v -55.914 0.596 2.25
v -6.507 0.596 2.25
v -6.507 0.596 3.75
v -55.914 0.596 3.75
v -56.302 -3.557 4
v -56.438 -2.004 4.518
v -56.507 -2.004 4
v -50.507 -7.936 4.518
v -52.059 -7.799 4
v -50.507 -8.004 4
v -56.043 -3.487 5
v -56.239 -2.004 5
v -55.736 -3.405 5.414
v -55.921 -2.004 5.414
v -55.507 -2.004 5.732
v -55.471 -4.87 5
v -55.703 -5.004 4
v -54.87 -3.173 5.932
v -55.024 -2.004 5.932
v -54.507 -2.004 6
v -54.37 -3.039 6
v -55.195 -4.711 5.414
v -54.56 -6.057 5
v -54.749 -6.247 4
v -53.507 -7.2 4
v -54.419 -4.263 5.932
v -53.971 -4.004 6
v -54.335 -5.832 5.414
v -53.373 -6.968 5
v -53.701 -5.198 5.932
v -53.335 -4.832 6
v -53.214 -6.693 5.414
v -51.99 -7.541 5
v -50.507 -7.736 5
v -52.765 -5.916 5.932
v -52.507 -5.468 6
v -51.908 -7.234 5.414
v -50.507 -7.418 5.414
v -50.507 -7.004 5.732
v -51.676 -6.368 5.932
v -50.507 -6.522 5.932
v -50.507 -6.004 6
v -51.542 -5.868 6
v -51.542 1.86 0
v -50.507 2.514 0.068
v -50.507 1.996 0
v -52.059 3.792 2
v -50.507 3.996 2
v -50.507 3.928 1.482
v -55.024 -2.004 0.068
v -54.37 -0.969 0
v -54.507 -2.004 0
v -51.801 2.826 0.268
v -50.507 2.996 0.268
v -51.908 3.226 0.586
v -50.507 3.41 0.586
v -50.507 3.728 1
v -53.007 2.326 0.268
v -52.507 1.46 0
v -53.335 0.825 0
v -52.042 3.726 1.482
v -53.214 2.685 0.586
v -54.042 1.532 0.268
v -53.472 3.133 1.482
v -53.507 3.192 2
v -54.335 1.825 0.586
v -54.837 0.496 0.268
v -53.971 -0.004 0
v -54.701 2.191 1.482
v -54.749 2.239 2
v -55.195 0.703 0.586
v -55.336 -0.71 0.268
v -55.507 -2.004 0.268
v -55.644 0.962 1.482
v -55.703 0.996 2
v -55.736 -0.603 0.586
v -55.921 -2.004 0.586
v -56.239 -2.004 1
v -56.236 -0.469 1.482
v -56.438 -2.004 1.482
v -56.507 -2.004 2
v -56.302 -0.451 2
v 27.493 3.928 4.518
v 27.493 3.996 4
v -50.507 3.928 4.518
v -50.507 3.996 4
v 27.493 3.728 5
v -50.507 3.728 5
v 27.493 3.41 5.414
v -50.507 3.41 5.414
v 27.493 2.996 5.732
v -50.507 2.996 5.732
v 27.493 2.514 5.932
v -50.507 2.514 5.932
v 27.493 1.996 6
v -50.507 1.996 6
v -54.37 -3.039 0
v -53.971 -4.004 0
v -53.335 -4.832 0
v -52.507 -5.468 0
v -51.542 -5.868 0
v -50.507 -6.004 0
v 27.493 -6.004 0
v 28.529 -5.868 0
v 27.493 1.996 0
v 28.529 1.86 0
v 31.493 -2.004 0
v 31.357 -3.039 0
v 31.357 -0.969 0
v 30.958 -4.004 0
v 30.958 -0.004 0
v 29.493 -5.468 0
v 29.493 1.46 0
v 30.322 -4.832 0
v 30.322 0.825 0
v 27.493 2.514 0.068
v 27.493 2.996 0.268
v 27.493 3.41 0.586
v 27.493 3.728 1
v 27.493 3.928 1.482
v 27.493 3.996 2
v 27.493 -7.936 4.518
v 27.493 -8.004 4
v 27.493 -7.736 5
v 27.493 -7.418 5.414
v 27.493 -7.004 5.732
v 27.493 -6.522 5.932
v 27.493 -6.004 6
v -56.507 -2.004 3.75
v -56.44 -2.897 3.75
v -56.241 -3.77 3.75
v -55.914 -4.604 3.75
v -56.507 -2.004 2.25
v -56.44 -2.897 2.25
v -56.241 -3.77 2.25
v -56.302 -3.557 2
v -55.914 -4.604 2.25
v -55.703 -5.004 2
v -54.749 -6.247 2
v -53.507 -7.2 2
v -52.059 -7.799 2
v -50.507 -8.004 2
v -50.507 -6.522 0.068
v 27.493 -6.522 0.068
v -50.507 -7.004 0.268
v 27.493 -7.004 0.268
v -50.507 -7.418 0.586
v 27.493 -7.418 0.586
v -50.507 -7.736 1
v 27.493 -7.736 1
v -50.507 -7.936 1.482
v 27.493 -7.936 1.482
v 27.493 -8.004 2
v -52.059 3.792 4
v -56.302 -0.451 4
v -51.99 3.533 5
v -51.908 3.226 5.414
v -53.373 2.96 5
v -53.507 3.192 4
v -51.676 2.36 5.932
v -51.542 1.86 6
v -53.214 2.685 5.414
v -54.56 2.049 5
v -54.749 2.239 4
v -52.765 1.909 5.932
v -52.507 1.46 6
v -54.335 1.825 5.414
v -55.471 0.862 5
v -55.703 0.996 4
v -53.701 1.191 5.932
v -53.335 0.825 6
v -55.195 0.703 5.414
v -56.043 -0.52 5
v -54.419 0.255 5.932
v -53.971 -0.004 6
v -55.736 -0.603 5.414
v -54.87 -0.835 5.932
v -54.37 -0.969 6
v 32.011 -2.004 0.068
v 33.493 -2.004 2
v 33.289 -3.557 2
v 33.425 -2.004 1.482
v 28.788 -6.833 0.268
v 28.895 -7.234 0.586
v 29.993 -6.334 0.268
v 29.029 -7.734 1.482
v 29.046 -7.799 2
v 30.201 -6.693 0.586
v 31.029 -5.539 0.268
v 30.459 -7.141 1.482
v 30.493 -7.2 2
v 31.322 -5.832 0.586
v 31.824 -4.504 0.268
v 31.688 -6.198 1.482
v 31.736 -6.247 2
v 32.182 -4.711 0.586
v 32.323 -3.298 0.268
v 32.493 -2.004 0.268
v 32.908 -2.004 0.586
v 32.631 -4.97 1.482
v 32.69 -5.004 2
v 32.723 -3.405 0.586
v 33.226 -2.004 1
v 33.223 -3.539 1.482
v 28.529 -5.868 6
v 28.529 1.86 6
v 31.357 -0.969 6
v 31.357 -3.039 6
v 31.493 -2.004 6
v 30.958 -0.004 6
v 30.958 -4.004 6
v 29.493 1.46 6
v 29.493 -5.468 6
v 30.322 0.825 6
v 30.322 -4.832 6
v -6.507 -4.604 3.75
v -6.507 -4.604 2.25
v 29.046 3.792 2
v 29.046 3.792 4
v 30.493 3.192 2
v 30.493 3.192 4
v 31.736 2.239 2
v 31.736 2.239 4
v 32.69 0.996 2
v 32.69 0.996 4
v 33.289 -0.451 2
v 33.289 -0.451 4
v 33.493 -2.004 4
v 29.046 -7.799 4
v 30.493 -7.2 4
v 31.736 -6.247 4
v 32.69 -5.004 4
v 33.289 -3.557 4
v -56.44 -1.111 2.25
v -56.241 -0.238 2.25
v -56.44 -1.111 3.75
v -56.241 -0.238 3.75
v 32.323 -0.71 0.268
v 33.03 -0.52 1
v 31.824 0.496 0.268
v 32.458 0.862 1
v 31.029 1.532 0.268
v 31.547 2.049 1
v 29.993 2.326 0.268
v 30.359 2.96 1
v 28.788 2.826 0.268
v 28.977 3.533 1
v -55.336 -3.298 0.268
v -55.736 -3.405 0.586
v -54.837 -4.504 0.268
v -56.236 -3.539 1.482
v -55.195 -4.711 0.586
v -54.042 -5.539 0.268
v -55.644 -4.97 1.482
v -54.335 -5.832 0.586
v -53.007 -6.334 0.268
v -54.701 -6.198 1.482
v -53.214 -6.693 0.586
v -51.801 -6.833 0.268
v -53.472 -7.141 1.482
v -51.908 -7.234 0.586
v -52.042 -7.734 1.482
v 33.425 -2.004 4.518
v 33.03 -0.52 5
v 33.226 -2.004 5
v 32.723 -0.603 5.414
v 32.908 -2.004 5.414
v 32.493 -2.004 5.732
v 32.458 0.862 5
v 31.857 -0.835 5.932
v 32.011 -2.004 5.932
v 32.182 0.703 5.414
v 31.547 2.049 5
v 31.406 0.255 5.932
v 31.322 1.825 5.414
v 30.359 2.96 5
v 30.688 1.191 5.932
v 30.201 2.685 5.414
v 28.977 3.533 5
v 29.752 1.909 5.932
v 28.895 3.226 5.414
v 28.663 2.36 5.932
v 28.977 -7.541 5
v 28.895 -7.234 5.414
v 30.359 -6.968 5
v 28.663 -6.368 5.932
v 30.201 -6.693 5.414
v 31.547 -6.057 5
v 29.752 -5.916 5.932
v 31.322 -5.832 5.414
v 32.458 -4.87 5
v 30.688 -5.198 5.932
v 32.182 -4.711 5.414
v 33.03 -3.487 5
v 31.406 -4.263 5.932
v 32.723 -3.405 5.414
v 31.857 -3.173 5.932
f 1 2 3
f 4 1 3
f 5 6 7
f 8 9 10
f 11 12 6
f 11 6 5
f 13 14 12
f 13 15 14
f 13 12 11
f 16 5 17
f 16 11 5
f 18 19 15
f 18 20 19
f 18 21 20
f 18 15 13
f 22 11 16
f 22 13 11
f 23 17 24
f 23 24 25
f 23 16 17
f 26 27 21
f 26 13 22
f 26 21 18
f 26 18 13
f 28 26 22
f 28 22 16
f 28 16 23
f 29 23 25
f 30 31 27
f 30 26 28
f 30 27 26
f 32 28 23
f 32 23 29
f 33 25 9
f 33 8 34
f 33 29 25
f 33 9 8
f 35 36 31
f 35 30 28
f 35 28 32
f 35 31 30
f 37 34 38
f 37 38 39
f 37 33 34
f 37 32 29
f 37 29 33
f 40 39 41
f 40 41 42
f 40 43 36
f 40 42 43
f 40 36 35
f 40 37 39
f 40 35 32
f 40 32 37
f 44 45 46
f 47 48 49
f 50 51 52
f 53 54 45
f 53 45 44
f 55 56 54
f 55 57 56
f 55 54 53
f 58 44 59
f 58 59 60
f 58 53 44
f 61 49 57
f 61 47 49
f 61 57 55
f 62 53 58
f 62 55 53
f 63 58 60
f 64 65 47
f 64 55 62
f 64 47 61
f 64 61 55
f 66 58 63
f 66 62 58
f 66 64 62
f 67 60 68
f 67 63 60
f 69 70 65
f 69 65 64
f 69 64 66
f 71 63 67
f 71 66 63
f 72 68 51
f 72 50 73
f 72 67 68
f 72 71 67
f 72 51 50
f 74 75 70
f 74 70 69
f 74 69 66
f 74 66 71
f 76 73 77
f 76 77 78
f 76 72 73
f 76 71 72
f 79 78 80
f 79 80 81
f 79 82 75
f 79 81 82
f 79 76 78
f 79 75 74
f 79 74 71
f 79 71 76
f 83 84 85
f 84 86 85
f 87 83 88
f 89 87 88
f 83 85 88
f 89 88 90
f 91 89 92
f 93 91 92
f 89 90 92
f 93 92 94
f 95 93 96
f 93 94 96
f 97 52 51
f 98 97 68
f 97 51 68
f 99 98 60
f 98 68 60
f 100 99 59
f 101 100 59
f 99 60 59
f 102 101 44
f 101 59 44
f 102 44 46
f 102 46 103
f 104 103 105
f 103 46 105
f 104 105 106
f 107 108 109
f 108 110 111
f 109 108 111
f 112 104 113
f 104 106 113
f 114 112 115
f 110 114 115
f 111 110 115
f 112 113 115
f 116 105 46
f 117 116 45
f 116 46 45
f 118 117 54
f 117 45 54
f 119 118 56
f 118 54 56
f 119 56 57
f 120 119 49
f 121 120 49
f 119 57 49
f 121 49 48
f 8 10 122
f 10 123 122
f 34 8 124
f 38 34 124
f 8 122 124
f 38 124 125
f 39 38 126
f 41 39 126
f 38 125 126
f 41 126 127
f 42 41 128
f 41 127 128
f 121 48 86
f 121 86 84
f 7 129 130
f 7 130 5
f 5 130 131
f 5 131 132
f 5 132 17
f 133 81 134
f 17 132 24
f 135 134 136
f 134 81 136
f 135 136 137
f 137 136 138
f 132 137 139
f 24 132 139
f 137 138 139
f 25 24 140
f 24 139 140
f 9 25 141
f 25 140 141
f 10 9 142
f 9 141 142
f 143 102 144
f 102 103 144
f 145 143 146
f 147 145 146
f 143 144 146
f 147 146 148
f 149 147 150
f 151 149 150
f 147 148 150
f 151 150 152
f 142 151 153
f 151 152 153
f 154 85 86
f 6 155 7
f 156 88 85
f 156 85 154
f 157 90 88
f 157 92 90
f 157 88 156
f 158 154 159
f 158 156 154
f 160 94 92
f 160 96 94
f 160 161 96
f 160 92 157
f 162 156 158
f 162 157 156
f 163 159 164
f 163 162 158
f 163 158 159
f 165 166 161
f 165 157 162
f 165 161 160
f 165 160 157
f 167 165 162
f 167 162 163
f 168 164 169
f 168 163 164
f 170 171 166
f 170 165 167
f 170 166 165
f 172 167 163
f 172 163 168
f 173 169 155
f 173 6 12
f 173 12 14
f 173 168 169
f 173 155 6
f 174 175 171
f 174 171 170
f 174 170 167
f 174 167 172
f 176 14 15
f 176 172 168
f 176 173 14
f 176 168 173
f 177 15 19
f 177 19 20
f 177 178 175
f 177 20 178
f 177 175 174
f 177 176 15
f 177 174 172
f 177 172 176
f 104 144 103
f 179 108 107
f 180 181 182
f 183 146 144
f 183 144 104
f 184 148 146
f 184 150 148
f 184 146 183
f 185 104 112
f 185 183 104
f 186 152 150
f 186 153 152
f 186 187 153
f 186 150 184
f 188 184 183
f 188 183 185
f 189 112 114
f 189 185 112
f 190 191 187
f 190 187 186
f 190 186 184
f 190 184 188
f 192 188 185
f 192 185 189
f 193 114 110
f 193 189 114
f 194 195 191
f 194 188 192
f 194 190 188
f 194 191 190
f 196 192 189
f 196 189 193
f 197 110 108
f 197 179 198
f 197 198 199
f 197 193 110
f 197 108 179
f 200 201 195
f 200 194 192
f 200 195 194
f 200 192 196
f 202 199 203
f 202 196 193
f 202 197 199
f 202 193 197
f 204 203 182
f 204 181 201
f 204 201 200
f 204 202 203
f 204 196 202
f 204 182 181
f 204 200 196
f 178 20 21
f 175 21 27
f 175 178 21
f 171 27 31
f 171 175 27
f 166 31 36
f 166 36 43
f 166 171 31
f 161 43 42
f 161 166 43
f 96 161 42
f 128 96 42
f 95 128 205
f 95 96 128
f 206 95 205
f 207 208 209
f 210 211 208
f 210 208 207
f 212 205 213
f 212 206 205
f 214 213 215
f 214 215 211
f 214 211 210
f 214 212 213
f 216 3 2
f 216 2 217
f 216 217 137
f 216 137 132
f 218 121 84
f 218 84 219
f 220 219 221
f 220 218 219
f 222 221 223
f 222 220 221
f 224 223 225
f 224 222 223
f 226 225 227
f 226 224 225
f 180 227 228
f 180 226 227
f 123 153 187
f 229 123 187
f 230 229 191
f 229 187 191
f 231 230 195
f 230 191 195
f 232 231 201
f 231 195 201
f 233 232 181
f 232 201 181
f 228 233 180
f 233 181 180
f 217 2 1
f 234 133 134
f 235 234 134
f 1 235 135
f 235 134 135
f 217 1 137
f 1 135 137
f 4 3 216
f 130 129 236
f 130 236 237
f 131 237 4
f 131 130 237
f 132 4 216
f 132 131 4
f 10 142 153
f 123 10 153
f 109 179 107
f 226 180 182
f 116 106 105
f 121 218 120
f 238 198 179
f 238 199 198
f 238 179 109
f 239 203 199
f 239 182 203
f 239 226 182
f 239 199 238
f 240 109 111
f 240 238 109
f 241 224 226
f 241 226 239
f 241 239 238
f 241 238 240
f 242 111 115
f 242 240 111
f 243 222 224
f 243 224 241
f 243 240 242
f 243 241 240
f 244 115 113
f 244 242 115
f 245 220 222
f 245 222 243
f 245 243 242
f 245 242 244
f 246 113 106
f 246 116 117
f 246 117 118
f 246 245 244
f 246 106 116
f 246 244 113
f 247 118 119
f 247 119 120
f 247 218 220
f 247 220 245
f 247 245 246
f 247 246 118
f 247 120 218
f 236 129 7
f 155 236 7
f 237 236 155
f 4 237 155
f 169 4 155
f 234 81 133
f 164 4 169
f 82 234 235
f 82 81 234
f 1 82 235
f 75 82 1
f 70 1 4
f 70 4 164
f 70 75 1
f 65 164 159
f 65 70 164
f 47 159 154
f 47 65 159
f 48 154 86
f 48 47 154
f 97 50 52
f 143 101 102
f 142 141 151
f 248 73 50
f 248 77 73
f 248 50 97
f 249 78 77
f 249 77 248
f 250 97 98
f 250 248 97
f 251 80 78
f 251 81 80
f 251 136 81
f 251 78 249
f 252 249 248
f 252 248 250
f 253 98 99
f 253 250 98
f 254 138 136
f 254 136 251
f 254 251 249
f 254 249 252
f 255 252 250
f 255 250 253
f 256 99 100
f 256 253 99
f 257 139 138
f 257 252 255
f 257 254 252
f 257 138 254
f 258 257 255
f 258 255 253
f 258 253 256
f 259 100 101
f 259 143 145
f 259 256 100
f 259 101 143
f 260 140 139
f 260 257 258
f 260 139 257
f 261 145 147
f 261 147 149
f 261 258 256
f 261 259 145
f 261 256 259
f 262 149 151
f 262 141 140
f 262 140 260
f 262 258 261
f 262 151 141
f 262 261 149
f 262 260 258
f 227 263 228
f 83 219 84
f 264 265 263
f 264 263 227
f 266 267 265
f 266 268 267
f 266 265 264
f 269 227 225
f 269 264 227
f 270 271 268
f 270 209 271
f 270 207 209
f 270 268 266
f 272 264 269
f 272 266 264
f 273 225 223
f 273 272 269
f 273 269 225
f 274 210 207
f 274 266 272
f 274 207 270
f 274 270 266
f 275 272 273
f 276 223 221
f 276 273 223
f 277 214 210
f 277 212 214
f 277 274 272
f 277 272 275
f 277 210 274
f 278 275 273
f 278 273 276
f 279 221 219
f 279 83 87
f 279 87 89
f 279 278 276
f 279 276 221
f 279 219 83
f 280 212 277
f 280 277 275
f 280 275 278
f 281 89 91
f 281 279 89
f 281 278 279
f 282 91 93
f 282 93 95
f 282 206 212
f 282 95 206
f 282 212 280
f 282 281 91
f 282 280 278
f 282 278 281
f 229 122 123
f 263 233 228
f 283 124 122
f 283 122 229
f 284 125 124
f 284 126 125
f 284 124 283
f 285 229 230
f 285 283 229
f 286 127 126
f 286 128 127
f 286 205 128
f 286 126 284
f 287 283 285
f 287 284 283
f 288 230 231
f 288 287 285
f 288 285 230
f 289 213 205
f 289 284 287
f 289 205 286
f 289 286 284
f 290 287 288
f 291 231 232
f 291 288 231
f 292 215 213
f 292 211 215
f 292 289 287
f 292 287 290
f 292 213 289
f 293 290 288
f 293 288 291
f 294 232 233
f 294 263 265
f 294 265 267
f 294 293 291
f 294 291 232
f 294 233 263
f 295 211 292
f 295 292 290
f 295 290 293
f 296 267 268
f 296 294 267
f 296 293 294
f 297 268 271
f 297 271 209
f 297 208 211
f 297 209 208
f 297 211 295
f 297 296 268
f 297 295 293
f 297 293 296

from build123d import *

# Parameters (mm, degrees)
F0_W        = 90
F0_H        = 12
F1_DEPTH    = 6
F2_W        = 5.2
F2_H        = 1.5
F3_DEPTH    = 50
F4_T1_DEPTH = 36
F5_R        = 2


# Not quite as in the source:
# - a fillet or chamfer that OpenCascade refuses, or shapes differently, is made with other operations: its cross-section is extruded or revolved along the edge and cut away or added


with BuildPart() as f1:
    # F0 (on Top) → F1 (new body)
    with BuildSketch(Plane.XY):
        with Locations((-11.5065481514, -2.003862651)):
            Rectangle(F0_W, F0_H)
    extrude(amount=F1_DEPTH)

    # F2 (on face) → F3 (cut)
    with BuildSketch(Plane(origin=(-56.5065481514, 0, 0), x_dir=(0, -1, 0), z_dir=(-1, 0, 0))):
        with Locations((2.003862651, 3)):
            Rectangle(F2_W, F2_H)
    extrude(amount=-F3_DEPTH, mode=Mode.SUBTRACT)

    # F4: fillet of radius 6 on 4 edges, made by hand

    # F4_s2 → F4_t1 (cut)
    with BuildSketch(Plane.XY.offset(-15)):
        with BuildLine():
            ThreePointArc((-56.5065481514, -2.003862651), (-54.7491888385, -6.2465033381), (-50.5065481514, -8.003862651))
            Line((-50.5065481514, -8.003862651), (-56.5065481514, -8.003862651))
            Line((-56.5065481514, -8.003862651), (-56.5065481514, -2.003862651))
        make_face()
        with BuildLine():
            ThreePointArc((-56.5065481514, -2.003862651), (-54.7491888385, 2.2387780361), (-50.5065481514, 3.996137349))
            Line((-50.5065481514, 3.996137349), (-56.5065481514, 3.996137349))
            Line((-56.5065481514, 3.996137349), (-56.5065481514, -2.003862651))
        make_face()
        with BuildLine():
            ThreePointArc((27.4934518486, -8.003862651), (31.7360925357, -6.2465033381), (33.4934518486, -2.003862651))
            Line((33.4934518486, -2.003862651), (33.4934518486, -8.003862651))
            Line((33.4934518486, -8.003862651), (27.4934518486, -8.003862651))
        make_face()
        with BuildLine():
            ThreePointArc((27.4934518486, 3.996137349), (31.7360925357, 2.2387780361), (33.4934518486, -2.003862651))
            Line((33.4934518486, -2.003862651), (33.4934518486, 3.996137349))
            Line((33.4934518486, 3.996137349), (27.4934518486, 3.996137349))
        make_face()
    extrude(amount=F4_T1_DEPTH, mode=Mode.SUBTRACT)

    # F5
    f5_edges = [f1.edges().sort_by_distance(p)[0] for p in [
        (-11.506548, -8.003863, 6),
        (-11.506548, -8.003863, 0),
    ]]
    fillet(f5_edges, radius=F5_R)


solid = f1.part
